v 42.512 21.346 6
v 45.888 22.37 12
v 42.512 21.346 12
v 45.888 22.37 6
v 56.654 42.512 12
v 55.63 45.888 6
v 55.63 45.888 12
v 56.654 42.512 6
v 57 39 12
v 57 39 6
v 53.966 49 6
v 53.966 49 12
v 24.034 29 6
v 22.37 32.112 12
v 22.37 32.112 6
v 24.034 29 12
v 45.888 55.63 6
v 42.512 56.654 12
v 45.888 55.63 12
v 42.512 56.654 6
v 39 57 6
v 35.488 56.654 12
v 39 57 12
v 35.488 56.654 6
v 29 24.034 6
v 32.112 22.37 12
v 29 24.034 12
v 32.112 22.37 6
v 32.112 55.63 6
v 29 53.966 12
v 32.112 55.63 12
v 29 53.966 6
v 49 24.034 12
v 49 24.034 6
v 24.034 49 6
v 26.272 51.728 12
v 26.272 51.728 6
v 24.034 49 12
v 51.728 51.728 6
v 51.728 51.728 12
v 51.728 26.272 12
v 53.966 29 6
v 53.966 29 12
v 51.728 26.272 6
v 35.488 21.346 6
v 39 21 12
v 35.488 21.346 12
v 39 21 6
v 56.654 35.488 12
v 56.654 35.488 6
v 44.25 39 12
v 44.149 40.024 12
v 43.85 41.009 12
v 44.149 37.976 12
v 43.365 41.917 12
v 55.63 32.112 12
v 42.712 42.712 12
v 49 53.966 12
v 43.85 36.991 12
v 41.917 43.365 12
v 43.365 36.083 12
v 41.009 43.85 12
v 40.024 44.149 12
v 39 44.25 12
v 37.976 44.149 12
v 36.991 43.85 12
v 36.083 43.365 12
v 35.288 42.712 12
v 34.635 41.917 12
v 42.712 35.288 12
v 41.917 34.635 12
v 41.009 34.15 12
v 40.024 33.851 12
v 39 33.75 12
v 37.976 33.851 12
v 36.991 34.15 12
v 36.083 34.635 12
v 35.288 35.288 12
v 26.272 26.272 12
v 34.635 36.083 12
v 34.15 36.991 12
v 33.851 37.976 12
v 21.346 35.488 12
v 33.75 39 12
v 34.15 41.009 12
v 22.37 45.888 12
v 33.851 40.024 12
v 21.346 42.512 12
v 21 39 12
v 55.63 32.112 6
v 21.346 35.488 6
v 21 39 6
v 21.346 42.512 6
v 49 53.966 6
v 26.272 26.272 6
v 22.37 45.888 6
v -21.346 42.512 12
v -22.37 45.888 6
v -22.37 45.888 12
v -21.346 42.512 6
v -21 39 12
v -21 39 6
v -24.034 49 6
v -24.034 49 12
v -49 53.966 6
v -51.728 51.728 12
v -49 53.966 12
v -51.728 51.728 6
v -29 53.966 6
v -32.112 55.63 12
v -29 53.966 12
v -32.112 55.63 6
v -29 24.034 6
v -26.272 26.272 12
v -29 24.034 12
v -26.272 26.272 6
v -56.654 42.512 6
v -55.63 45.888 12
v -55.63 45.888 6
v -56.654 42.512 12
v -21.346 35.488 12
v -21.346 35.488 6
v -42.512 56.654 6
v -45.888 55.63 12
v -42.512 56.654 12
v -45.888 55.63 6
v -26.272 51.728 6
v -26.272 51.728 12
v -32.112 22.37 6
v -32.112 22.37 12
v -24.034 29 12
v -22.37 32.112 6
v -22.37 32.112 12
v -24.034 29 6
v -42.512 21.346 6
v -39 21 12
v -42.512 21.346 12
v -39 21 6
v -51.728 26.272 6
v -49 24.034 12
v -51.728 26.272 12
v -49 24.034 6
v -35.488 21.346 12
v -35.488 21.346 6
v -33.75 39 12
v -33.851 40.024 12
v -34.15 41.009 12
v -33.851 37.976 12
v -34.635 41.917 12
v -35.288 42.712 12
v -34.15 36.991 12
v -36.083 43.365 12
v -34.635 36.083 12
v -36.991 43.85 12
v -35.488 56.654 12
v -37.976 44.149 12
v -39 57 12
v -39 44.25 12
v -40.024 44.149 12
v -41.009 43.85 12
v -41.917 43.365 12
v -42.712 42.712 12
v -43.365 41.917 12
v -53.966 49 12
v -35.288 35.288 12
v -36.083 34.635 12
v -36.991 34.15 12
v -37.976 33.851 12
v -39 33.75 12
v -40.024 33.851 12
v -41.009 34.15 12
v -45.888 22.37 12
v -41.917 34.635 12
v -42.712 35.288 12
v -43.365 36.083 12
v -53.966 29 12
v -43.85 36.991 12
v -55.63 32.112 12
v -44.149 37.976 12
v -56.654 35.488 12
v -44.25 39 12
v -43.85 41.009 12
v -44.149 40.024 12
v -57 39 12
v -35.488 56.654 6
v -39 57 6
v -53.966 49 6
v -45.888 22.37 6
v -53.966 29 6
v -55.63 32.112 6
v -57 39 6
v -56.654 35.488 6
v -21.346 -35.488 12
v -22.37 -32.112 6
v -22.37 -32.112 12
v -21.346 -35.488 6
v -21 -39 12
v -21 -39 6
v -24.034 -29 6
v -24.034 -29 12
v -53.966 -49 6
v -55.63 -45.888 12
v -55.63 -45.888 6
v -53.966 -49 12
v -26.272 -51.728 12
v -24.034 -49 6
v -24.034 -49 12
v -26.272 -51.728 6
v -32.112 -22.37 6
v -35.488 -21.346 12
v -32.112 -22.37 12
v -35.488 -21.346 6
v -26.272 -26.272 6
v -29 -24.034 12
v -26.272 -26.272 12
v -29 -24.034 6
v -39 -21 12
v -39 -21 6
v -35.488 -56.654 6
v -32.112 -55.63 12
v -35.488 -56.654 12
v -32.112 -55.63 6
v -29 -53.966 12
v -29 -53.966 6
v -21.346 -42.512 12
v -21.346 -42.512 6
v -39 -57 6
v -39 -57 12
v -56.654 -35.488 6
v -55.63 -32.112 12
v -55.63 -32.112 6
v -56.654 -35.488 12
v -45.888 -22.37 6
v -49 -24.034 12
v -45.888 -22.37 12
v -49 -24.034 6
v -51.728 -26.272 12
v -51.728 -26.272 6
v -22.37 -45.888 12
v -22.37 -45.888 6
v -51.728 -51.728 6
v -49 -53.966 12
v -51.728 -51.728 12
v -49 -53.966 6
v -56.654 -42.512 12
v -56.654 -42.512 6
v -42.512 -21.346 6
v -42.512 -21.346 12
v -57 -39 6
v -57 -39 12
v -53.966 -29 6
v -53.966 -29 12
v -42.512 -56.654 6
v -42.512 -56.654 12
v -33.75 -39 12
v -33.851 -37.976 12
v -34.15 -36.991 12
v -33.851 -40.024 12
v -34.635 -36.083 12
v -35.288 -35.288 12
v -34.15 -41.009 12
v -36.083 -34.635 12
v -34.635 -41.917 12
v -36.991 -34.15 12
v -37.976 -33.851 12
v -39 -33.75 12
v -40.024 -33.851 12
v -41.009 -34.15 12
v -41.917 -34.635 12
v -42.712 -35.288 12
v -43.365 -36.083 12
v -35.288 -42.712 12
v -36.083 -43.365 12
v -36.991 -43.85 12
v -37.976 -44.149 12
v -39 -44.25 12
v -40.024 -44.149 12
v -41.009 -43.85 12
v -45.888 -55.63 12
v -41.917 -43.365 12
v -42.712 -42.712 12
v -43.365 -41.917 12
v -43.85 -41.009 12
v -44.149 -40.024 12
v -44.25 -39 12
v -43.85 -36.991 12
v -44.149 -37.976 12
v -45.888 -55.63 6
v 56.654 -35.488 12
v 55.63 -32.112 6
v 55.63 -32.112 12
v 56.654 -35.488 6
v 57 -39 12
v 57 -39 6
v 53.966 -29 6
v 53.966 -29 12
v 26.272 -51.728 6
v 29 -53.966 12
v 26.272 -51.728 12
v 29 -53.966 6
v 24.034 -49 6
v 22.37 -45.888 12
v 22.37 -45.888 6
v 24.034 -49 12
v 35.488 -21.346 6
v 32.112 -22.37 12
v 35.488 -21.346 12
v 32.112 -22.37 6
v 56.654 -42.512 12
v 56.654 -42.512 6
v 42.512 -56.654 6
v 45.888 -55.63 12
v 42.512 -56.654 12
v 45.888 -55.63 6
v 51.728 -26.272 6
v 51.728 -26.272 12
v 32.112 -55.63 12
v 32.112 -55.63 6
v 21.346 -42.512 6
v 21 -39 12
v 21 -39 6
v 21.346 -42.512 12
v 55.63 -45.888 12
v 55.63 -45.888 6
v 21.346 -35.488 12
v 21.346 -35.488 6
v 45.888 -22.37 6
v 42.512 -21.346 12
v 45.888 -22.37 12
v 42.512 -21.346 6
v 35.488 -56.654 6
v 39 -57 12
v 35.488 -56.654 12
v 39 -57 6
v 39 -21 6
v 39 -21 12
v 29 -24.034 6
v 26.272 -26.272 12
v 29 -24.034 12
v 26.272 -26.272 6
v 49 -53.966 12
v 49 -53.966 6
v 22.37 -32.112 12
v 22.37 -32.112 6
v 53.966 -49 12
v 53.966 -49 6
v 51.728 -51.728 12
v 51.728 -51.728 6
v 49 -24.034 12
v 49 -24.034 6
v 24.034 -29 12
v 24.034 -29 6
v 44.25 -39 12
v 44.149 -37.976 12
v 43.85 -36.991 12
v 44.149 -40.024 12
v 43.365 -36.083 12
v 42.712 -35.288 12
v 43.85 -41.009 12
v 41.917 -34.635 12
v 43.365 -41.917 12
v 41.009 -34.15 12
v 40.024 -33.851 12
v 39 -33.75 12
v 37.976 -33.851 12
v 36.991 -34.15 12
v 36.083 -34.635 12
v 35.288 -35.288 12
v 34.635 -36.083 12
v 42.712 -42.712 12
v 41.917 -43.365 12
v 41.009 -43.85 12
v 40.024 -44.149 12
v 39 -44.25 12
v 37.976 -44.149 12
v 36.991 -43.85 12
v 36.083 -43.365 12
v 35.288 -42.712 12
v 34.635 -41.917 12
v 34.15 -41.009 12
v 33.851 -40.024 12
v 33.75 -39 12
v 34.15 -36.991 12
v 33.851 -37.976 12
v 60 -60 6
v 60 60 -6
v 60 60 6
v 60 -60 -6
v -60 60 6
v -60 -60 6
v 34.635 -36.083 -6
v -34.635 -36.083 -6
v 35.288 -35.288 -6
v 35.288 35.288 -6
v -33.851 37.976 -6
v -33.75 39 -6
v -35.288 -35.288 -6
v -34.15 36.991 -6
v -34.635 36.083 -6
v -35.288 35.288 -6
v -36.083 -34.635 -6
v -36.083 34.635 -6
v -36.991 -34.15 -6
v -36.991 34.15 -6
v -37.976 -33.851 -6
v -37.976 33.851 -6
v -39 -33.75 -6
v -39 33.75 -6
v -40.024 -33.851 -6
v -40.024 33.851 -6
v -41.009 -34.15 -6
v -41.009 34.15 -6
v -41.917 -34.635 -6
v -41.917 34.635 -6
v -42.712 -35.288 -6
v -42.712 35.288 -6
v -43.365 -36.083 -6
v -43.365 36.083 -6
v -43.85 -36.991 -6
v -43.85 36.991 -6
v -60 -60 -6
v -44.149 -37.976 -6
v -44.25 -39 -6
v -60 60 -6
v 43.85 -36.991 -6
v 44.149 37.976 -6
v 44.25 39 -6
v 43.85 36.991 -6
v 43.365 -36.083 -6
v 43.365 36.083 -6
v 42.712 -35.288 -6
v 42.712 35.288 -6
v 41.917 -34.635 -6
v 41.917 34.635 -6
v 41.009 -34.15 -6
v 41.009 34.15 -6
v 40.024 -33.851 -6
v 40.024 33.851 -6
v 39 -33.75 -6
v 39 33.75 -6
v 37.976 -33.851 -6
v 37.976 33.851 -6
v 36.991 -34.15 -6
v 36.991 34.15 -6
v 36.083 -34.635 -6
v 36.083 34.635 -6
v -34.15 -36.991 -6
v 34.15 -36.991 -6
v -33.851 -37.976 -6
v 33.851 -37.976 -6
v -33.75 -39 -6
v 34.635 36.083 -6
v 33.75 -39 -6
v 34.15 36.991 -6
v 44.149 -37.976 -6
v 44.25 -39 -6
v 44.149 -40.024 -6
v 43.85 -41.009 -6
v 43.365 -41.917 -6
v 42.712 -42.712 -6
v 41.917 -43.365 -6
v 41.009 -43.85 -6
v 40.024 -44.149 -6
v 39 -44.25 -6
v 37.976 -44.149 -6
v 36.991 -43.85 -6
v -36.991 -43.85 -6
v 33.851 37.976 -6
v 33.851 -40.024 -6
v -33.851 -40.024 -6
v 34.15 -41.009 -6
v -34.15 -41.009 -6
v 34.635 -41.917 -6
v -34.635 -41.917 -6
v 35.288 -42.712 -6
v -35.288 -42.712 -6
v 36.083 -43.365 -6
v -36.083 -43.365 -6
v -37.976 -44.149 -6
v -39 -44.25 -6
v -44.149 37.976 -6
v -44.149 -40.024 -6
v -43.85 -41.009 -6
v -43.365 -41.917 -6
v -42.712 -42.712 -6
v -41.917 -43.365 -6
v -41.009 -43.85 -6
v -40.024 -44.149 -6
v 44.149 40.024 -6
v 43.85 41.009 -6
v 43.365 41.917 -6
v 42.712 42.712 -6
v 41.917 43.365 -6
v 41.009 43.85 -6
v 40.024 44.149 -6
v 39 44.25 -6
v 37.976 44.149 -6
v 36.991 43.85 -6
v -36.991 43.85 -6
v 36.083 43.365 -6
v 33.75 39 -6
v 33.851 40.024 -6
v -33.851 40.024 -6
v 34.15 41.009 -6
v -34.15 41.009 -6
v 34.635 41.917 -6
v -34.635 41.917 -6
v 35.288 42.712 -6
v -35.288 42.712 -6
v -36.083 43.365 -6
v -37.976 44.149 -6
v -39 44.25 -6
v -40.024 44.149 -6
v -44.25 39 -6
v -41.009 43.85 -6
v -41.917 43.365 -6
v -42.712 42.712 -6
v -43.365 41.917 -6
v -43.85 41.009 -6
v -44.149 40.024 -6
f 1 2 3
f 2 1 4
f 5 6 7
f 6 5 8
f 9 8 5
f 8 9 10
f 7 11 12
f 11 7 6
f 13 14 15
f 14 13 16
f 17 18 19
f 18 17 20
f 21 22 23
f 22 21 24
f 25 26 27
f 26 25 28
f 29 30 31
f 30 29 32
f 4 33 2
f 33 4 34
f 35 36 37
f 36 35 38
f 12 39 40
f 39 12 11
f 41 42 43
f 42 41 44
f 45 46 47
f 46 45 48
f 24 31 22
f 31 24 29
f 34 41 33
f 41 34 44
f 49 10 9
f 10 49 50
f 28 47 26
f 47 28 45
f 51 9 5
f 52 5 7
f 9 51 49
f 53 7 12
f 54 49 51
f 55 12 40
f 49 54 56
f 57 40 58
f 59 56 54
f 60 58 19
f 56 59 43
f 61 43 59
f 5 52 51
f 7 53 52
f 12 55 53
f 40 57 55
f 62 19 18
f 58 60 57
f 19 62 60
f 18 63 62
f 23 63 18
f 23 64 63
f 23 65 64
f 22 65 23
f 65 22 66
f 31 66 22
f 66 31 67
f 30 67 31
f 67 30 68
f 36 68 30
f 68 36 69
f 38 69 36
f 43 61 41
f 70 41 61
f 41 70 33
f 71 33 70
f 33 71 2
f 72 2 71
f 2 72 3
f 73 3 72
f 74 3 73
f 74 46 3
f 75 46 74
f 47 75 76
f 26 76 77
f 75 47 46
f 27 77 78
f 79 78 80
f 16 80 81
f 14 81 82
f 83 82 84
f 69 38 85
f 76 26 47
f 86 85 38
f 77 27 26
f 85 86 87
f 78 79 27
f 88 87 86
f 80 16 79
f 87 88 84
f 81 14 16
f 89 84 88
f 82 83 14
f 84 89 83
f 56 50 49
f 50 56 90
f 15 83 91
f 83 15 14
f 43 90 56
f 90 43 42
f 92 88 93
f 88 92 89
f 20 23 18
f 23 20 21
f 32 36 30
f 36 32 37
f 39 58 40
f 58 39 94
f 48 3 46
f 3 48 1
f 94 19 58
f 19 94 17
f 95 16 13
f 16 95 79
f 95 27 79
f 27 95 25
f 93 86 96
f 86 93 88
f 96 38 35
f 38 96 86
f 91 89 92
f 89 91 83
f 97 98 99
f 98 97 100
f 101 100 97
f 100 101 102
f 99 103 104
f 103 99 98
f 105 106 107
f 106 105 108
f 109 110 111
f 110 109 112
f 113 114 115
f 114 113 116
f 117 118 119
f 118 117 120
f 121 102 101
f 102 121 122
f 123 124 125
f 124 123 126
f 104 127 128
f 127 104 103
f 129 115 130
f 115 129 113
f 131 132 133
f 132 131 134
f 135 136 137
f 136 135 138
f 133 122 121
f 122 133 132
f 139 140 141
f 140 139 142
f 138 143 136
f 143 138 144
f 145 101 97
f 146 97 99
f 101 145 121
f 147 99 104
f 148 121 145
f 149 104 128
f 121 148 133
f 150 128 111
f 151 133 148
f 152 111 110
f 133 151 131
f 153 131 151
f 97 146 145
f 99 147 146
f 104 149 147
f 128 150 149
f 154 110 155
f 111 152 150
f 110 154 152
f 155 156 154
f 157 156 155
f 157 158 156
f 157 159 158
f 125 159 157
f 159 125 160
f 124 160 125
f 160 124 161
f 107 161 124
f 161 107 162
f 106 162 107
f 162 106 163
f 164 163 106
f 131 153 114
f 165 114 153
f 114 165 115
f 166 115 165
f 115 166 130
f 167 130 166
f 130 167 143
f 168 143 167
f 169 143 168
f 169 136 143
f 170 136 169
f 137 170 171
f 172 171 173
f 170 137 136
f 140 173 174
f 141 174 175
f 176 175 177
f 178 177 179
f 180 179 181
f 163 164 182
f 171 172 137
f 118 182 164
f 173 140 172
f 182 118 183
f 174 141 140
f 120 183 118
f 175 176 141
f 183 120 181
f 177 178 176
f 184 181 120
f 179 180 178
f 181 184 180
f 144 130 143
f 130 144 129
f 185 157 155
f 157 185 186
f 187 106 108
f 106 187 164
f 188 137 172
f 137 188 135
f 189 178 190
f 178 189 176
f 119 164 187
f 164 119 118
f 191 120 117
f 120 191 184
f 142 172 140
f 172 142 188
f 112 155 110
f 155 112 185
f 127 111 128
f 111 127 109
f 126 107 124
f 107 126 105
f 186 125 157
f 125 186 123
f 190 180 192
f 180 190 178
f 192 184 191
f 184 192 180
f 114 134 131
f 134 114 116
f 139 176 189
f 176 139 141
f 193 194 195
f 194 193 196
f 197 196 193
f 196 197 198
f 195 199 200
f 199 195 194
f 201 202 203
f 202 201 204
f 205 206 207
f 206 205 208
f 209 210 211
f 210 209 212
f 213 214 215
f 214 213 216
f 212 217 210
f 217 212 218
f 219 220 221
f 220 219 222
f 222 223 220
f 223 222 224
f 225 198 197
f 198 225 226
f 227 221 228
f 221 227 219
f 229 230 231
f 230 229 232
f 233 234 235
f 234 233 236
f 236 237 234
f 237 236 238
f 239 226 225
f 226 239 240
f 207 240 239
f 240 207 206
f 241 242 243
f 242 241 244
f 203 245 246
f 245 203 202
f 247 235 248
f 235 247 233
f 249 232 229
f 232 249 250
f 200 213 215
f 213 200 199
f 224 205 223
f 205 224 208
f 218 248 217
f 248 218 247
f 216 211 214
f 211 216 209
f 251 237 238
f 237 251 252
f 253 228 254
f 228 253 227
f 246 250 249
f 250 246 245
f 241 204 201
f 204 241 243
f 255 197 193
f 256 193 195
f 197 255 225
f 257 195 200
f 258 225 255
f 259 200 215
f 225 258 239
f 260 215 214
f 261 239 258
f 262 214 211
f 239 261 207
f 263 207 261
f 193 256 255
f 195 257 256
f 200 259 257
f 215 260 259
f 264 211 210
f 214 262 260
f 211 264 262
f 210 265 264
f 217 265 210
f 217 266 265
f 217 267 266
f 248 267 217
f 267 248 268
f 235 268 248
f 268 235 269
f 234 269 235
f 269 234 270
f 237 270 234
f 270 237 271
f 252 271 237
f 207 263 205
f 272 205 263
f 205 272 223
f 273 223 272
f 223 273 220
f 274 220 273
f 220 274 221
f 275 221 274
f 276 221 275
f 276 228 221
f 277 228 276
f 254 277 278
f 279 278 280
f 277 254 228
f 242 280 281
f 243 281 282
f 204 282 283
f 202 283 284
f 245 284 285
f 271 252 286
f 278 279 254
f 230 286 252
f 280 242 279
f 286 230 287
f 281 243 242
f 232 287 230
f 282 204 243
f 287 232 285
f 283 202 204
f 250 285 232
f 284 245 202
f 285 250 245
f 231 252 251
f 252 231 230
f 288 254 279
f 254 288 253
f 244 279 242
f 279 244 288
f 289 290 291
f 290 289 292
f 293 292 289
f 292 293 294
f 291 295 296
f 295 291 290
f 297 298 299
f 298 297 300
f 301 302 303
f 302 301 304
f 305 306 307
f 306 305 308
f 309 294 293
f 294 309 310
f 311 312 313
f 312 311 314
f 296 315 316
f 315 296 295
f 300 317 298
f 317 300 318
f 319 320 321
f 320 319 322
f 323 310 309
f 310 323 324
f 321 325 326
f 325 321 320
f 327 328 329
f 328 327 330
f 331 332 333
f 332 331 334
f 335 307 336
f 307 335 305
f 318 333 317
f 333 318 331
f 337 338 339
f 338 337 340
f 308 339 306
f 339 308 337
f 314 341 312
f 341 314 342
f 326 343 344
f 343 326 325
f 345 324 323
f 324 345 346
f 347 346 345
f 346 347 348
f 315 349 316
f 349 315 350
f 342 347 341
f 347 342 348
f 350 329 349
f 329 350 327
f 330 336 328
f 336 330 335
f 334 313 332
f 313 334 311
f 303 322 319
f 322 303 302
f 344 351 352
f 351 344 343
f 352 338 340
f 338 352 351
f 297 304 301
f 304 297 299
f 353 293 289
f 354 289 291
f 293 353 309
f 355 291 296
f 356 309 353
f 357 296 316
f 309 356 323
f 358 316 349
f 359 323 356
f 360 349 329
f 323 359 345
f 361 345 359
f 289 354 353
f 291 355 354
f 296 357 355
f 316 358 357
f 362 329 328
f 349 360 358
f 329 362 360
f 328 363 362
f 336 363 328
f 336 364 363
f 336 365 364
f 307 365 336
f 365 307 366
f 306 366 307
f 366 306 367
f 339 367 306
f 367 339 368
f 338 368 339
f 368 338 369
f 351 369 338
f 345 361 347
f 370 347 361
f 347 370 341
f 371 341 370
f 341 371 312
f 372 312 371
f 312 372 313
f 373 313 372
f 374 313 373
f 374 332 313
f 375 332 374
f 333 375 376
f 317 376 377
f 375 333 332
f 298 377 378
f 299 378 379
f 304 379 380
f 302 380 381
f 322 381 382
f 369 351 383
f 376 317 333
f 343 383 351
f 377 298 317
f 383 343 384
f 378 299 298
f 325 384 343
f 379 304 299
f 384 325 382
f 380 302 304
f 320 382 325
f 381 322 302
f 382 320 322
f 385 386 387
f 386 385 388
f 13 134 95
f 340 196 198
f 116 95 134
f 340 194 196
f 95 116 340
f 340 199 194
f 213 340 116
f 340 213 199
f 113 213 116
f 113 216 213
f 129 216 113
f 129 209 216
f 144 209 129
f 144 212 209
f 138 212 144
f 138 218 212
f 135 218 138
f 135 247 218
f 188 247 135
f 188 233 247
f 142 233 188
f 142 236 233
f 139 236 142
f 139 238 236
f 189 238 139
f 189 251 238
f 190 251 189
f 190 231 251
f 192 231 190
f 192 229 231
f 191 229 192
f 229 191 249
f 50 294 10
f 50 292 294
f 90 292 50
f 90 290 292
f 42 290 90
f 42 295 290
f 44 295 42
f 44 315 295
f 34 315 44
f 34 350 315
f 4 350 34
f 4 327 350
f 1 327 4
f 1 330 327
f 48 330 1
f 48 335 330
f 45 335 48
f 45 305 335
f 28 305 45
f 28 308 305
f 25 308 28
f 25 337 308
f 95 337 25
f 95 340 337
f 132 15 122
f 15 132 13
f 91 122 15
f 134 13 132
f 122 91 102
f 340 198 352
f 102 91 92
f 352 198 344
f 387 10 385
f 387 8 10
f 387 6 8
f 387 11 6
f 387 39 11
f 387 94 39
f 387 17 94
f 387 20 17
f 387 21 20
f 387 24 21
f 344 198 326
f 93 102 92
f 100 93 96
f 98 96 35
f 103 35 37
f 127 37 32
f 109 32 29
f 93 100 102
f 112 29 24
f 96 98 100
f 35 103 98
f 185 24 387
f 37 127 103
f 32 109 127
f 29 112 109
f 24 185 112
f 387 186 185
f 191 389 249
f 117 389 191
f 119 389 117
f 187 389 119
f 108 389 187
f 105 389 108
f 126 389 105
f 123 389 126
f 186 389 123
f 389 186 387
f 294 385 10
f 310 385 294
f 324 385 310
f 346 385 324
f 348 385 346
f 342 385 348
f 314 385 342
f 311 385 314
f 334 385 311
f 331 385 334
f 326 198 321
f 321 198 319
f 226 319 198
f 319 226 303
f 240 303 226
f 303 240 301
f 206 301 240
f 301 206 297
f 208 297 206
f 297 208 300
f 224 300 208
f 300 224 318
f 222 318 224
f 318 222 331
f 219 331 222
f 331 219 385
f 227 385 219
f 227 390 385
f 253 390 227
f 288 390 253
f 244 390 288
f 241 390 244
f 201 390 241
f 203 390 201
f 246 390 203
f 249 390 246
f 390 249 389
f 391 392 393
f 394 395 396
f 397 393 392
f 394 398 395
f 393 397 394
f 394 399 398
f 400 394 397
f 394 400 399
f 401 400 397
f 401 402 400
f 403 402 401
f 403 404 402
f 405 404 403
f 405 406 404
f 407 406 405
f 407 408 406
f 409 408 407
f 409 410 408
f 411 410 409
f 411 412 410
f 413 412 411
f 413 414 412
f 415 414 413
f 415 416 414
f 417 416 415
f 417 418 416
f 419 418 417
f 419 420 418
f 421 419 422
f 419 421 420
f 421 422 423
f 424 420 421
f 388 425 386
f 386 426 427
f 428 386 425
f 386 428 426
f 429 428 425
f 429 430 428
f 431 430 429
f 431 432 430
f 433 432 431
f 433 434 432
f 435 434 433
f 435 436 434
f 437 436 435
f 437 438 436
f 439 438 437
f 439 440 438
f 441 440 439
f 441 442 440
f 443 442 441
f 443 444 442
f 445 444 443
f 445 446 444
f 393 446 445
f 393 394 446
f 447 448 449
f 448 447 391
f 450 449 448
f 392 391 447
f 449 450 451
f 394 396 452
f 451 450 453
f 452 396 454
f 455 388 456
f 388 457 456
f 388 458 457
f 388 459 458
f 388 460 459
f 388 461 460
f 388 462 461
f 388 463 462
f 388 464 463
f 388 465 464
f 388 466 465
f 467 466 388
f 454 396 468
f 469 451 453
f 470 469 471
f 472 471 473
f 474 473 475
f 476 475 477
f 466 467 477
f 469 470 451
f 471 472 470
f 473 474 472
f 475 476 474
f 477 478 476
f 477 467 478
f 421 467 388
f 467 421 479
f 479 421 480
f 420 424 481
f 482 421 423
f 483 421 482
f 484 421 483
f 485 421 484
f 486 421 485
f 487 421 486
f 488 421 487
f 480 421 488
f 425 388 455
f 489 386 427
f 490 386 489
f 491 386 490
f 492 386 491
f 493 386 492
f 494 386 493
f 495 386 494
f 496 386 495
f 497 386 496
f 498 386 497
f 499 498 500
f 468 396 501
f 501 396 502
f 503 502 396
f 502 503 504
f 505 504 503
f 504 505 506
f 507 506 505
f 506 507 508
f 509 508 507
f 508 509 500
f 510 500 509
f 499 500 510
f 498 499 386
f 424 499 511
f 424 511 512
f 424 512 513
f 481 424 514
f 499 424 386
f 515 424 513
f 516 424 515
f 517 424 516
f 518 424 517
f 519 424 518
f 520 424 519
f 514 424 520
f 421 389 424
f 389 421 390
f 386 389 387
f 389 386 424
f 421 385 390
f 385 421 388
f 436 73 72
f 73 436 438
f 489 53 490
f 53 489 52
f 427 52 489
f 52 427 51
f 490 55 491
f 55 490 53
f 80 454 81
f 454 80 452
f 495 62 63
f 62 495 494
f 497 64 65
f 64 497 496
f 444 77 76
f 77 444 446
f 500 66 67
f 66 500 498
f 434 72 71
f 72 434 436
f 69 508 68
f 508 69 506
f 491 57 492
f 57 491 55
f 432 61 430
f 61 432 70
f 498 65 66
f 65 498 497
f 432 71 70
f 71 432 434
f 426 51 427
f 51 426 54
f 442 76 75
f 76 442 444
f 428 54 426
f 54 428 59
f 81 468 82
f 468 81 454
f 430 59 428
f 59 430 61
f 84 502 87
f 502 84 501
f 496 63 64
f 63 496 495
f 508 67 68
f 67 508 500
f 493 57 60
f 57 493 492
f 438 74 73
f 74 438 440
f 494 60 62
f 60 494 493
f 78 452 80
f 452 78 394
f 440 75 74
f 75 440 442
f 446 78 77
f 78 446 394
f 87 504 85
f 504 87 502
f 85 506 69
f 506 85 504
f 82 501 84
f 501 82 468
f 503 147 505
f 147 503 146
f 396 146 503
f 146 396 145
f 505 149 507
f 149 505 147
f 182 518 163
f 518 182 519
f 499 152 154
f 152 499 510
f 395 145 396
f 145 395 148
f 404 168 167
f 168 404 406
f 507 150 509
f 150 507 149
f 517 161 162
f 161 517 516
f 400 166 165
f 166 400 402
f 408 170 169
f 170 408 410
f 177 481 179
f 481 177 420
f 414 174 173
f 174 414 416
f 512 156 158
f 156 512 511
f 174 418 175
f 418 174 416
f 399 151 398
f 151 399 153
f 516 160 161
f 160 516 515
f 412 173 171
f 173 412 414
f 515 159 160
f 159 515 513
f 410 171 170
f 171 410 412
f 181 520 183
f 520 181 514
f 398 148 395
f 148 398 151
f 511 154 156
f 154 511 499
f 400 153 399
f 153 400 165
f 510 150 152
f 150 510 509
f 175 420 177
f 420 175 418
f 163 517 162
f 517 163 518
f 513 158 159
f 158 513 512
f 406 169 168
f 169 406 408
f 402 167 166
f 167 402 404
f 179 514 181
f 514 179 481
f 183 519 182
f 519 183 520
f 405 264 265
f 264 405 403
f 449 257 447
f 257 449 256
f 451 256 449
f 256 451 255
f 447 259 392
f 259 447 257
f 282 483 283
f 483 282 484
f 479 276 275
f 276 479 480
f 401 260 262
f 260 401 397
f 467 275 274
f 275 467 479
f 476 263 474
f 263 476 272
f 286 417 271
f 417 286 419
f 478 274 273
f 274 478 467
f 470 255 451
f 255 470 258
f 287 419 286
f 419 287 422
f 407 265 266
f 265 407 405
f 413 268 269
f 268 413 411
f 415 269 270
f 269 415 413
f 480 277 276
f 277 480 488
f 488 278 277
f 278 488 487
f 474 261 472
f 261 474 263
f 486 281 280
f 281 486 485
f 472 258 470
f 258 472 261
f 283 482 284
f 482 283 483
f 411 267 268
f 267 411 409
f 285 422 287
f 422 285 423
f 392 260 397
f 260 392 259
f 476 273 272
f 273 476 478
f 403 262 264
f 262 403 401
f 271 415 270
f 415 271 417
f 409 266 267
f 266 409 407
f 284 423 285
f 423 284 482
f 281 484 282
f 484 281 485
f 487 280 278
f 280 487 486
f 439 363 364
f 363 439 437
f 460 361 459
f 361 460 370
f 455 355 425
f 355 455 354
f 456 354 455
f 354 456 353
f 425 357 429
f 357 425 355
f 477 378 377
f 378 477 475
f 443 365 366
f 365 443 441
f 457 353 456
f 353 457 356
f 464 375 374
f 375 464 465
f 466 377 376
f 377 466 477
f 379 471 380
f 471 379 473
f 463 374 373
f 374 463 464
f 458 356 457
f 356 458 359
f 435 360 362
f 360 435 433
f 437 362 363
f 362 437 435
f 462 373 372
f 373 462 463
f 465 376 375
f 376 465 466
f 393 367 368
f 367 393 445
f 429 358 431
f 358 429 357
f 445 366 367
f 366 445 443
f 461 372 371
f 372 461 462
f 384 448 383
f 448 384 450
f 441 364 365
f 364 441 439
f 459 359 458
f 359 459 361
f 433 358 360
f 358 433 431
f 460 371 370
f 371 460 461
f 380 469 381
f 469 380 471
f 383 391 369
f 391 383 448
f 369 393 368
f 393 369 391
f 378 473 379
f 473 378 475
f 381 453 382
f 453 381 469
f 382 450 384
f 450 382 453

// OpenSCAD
$fn = 32;

// ----------------------------------------------------------------------
// Anchor pads 120 x 120 x 18
// four corner bosses with anchor holes
// ----------------------------------------------------------------------

// --- parameters (mm) ---
plate = [120, 120, 12];  // base plate size (x, y, z)
pads = 4;                // boss count, one per corner
edge = 21;               // boss centre offset from the plate edge
boss_d = 36;             // boss diameter
boss_h = 6;              // boss height above the base plate
hole_d = 10.5;           // hole diameter

// --- derived feature positions (mm) ---
height = plate[2] + boss_h;      // = 18   overall height of the part
corner_x = plate[0] / 2 - edge;  // = 39   boss centre X
corner_y = plate[1] / 2 - edge;  // = 39   boss centre Y
feature_centers = [
  [corner_x, corner_y],
  [-corner_x, corner_y],
  [-corner_x, -corner_y],
  [corner_x, -corner_y]
];   // boss centres, anchor holes are drilled there

// base plate, four bosses standing on it, anchor holes all the way through
difference() {
  union() {
    cube(plate, center = true);
    for (centre = feature_centers)
      translate([centre[0], centre[1], plate[2] / 2 - 1])
        cylinder(d = boss_d, h = boss_h + 1);
  }
  for (centre = feature_centers)
    translate([centre[0], centre[1], -height])
      cylinder(d = hole_d, h = 2 * height + 2);  // through boss and plate
}
